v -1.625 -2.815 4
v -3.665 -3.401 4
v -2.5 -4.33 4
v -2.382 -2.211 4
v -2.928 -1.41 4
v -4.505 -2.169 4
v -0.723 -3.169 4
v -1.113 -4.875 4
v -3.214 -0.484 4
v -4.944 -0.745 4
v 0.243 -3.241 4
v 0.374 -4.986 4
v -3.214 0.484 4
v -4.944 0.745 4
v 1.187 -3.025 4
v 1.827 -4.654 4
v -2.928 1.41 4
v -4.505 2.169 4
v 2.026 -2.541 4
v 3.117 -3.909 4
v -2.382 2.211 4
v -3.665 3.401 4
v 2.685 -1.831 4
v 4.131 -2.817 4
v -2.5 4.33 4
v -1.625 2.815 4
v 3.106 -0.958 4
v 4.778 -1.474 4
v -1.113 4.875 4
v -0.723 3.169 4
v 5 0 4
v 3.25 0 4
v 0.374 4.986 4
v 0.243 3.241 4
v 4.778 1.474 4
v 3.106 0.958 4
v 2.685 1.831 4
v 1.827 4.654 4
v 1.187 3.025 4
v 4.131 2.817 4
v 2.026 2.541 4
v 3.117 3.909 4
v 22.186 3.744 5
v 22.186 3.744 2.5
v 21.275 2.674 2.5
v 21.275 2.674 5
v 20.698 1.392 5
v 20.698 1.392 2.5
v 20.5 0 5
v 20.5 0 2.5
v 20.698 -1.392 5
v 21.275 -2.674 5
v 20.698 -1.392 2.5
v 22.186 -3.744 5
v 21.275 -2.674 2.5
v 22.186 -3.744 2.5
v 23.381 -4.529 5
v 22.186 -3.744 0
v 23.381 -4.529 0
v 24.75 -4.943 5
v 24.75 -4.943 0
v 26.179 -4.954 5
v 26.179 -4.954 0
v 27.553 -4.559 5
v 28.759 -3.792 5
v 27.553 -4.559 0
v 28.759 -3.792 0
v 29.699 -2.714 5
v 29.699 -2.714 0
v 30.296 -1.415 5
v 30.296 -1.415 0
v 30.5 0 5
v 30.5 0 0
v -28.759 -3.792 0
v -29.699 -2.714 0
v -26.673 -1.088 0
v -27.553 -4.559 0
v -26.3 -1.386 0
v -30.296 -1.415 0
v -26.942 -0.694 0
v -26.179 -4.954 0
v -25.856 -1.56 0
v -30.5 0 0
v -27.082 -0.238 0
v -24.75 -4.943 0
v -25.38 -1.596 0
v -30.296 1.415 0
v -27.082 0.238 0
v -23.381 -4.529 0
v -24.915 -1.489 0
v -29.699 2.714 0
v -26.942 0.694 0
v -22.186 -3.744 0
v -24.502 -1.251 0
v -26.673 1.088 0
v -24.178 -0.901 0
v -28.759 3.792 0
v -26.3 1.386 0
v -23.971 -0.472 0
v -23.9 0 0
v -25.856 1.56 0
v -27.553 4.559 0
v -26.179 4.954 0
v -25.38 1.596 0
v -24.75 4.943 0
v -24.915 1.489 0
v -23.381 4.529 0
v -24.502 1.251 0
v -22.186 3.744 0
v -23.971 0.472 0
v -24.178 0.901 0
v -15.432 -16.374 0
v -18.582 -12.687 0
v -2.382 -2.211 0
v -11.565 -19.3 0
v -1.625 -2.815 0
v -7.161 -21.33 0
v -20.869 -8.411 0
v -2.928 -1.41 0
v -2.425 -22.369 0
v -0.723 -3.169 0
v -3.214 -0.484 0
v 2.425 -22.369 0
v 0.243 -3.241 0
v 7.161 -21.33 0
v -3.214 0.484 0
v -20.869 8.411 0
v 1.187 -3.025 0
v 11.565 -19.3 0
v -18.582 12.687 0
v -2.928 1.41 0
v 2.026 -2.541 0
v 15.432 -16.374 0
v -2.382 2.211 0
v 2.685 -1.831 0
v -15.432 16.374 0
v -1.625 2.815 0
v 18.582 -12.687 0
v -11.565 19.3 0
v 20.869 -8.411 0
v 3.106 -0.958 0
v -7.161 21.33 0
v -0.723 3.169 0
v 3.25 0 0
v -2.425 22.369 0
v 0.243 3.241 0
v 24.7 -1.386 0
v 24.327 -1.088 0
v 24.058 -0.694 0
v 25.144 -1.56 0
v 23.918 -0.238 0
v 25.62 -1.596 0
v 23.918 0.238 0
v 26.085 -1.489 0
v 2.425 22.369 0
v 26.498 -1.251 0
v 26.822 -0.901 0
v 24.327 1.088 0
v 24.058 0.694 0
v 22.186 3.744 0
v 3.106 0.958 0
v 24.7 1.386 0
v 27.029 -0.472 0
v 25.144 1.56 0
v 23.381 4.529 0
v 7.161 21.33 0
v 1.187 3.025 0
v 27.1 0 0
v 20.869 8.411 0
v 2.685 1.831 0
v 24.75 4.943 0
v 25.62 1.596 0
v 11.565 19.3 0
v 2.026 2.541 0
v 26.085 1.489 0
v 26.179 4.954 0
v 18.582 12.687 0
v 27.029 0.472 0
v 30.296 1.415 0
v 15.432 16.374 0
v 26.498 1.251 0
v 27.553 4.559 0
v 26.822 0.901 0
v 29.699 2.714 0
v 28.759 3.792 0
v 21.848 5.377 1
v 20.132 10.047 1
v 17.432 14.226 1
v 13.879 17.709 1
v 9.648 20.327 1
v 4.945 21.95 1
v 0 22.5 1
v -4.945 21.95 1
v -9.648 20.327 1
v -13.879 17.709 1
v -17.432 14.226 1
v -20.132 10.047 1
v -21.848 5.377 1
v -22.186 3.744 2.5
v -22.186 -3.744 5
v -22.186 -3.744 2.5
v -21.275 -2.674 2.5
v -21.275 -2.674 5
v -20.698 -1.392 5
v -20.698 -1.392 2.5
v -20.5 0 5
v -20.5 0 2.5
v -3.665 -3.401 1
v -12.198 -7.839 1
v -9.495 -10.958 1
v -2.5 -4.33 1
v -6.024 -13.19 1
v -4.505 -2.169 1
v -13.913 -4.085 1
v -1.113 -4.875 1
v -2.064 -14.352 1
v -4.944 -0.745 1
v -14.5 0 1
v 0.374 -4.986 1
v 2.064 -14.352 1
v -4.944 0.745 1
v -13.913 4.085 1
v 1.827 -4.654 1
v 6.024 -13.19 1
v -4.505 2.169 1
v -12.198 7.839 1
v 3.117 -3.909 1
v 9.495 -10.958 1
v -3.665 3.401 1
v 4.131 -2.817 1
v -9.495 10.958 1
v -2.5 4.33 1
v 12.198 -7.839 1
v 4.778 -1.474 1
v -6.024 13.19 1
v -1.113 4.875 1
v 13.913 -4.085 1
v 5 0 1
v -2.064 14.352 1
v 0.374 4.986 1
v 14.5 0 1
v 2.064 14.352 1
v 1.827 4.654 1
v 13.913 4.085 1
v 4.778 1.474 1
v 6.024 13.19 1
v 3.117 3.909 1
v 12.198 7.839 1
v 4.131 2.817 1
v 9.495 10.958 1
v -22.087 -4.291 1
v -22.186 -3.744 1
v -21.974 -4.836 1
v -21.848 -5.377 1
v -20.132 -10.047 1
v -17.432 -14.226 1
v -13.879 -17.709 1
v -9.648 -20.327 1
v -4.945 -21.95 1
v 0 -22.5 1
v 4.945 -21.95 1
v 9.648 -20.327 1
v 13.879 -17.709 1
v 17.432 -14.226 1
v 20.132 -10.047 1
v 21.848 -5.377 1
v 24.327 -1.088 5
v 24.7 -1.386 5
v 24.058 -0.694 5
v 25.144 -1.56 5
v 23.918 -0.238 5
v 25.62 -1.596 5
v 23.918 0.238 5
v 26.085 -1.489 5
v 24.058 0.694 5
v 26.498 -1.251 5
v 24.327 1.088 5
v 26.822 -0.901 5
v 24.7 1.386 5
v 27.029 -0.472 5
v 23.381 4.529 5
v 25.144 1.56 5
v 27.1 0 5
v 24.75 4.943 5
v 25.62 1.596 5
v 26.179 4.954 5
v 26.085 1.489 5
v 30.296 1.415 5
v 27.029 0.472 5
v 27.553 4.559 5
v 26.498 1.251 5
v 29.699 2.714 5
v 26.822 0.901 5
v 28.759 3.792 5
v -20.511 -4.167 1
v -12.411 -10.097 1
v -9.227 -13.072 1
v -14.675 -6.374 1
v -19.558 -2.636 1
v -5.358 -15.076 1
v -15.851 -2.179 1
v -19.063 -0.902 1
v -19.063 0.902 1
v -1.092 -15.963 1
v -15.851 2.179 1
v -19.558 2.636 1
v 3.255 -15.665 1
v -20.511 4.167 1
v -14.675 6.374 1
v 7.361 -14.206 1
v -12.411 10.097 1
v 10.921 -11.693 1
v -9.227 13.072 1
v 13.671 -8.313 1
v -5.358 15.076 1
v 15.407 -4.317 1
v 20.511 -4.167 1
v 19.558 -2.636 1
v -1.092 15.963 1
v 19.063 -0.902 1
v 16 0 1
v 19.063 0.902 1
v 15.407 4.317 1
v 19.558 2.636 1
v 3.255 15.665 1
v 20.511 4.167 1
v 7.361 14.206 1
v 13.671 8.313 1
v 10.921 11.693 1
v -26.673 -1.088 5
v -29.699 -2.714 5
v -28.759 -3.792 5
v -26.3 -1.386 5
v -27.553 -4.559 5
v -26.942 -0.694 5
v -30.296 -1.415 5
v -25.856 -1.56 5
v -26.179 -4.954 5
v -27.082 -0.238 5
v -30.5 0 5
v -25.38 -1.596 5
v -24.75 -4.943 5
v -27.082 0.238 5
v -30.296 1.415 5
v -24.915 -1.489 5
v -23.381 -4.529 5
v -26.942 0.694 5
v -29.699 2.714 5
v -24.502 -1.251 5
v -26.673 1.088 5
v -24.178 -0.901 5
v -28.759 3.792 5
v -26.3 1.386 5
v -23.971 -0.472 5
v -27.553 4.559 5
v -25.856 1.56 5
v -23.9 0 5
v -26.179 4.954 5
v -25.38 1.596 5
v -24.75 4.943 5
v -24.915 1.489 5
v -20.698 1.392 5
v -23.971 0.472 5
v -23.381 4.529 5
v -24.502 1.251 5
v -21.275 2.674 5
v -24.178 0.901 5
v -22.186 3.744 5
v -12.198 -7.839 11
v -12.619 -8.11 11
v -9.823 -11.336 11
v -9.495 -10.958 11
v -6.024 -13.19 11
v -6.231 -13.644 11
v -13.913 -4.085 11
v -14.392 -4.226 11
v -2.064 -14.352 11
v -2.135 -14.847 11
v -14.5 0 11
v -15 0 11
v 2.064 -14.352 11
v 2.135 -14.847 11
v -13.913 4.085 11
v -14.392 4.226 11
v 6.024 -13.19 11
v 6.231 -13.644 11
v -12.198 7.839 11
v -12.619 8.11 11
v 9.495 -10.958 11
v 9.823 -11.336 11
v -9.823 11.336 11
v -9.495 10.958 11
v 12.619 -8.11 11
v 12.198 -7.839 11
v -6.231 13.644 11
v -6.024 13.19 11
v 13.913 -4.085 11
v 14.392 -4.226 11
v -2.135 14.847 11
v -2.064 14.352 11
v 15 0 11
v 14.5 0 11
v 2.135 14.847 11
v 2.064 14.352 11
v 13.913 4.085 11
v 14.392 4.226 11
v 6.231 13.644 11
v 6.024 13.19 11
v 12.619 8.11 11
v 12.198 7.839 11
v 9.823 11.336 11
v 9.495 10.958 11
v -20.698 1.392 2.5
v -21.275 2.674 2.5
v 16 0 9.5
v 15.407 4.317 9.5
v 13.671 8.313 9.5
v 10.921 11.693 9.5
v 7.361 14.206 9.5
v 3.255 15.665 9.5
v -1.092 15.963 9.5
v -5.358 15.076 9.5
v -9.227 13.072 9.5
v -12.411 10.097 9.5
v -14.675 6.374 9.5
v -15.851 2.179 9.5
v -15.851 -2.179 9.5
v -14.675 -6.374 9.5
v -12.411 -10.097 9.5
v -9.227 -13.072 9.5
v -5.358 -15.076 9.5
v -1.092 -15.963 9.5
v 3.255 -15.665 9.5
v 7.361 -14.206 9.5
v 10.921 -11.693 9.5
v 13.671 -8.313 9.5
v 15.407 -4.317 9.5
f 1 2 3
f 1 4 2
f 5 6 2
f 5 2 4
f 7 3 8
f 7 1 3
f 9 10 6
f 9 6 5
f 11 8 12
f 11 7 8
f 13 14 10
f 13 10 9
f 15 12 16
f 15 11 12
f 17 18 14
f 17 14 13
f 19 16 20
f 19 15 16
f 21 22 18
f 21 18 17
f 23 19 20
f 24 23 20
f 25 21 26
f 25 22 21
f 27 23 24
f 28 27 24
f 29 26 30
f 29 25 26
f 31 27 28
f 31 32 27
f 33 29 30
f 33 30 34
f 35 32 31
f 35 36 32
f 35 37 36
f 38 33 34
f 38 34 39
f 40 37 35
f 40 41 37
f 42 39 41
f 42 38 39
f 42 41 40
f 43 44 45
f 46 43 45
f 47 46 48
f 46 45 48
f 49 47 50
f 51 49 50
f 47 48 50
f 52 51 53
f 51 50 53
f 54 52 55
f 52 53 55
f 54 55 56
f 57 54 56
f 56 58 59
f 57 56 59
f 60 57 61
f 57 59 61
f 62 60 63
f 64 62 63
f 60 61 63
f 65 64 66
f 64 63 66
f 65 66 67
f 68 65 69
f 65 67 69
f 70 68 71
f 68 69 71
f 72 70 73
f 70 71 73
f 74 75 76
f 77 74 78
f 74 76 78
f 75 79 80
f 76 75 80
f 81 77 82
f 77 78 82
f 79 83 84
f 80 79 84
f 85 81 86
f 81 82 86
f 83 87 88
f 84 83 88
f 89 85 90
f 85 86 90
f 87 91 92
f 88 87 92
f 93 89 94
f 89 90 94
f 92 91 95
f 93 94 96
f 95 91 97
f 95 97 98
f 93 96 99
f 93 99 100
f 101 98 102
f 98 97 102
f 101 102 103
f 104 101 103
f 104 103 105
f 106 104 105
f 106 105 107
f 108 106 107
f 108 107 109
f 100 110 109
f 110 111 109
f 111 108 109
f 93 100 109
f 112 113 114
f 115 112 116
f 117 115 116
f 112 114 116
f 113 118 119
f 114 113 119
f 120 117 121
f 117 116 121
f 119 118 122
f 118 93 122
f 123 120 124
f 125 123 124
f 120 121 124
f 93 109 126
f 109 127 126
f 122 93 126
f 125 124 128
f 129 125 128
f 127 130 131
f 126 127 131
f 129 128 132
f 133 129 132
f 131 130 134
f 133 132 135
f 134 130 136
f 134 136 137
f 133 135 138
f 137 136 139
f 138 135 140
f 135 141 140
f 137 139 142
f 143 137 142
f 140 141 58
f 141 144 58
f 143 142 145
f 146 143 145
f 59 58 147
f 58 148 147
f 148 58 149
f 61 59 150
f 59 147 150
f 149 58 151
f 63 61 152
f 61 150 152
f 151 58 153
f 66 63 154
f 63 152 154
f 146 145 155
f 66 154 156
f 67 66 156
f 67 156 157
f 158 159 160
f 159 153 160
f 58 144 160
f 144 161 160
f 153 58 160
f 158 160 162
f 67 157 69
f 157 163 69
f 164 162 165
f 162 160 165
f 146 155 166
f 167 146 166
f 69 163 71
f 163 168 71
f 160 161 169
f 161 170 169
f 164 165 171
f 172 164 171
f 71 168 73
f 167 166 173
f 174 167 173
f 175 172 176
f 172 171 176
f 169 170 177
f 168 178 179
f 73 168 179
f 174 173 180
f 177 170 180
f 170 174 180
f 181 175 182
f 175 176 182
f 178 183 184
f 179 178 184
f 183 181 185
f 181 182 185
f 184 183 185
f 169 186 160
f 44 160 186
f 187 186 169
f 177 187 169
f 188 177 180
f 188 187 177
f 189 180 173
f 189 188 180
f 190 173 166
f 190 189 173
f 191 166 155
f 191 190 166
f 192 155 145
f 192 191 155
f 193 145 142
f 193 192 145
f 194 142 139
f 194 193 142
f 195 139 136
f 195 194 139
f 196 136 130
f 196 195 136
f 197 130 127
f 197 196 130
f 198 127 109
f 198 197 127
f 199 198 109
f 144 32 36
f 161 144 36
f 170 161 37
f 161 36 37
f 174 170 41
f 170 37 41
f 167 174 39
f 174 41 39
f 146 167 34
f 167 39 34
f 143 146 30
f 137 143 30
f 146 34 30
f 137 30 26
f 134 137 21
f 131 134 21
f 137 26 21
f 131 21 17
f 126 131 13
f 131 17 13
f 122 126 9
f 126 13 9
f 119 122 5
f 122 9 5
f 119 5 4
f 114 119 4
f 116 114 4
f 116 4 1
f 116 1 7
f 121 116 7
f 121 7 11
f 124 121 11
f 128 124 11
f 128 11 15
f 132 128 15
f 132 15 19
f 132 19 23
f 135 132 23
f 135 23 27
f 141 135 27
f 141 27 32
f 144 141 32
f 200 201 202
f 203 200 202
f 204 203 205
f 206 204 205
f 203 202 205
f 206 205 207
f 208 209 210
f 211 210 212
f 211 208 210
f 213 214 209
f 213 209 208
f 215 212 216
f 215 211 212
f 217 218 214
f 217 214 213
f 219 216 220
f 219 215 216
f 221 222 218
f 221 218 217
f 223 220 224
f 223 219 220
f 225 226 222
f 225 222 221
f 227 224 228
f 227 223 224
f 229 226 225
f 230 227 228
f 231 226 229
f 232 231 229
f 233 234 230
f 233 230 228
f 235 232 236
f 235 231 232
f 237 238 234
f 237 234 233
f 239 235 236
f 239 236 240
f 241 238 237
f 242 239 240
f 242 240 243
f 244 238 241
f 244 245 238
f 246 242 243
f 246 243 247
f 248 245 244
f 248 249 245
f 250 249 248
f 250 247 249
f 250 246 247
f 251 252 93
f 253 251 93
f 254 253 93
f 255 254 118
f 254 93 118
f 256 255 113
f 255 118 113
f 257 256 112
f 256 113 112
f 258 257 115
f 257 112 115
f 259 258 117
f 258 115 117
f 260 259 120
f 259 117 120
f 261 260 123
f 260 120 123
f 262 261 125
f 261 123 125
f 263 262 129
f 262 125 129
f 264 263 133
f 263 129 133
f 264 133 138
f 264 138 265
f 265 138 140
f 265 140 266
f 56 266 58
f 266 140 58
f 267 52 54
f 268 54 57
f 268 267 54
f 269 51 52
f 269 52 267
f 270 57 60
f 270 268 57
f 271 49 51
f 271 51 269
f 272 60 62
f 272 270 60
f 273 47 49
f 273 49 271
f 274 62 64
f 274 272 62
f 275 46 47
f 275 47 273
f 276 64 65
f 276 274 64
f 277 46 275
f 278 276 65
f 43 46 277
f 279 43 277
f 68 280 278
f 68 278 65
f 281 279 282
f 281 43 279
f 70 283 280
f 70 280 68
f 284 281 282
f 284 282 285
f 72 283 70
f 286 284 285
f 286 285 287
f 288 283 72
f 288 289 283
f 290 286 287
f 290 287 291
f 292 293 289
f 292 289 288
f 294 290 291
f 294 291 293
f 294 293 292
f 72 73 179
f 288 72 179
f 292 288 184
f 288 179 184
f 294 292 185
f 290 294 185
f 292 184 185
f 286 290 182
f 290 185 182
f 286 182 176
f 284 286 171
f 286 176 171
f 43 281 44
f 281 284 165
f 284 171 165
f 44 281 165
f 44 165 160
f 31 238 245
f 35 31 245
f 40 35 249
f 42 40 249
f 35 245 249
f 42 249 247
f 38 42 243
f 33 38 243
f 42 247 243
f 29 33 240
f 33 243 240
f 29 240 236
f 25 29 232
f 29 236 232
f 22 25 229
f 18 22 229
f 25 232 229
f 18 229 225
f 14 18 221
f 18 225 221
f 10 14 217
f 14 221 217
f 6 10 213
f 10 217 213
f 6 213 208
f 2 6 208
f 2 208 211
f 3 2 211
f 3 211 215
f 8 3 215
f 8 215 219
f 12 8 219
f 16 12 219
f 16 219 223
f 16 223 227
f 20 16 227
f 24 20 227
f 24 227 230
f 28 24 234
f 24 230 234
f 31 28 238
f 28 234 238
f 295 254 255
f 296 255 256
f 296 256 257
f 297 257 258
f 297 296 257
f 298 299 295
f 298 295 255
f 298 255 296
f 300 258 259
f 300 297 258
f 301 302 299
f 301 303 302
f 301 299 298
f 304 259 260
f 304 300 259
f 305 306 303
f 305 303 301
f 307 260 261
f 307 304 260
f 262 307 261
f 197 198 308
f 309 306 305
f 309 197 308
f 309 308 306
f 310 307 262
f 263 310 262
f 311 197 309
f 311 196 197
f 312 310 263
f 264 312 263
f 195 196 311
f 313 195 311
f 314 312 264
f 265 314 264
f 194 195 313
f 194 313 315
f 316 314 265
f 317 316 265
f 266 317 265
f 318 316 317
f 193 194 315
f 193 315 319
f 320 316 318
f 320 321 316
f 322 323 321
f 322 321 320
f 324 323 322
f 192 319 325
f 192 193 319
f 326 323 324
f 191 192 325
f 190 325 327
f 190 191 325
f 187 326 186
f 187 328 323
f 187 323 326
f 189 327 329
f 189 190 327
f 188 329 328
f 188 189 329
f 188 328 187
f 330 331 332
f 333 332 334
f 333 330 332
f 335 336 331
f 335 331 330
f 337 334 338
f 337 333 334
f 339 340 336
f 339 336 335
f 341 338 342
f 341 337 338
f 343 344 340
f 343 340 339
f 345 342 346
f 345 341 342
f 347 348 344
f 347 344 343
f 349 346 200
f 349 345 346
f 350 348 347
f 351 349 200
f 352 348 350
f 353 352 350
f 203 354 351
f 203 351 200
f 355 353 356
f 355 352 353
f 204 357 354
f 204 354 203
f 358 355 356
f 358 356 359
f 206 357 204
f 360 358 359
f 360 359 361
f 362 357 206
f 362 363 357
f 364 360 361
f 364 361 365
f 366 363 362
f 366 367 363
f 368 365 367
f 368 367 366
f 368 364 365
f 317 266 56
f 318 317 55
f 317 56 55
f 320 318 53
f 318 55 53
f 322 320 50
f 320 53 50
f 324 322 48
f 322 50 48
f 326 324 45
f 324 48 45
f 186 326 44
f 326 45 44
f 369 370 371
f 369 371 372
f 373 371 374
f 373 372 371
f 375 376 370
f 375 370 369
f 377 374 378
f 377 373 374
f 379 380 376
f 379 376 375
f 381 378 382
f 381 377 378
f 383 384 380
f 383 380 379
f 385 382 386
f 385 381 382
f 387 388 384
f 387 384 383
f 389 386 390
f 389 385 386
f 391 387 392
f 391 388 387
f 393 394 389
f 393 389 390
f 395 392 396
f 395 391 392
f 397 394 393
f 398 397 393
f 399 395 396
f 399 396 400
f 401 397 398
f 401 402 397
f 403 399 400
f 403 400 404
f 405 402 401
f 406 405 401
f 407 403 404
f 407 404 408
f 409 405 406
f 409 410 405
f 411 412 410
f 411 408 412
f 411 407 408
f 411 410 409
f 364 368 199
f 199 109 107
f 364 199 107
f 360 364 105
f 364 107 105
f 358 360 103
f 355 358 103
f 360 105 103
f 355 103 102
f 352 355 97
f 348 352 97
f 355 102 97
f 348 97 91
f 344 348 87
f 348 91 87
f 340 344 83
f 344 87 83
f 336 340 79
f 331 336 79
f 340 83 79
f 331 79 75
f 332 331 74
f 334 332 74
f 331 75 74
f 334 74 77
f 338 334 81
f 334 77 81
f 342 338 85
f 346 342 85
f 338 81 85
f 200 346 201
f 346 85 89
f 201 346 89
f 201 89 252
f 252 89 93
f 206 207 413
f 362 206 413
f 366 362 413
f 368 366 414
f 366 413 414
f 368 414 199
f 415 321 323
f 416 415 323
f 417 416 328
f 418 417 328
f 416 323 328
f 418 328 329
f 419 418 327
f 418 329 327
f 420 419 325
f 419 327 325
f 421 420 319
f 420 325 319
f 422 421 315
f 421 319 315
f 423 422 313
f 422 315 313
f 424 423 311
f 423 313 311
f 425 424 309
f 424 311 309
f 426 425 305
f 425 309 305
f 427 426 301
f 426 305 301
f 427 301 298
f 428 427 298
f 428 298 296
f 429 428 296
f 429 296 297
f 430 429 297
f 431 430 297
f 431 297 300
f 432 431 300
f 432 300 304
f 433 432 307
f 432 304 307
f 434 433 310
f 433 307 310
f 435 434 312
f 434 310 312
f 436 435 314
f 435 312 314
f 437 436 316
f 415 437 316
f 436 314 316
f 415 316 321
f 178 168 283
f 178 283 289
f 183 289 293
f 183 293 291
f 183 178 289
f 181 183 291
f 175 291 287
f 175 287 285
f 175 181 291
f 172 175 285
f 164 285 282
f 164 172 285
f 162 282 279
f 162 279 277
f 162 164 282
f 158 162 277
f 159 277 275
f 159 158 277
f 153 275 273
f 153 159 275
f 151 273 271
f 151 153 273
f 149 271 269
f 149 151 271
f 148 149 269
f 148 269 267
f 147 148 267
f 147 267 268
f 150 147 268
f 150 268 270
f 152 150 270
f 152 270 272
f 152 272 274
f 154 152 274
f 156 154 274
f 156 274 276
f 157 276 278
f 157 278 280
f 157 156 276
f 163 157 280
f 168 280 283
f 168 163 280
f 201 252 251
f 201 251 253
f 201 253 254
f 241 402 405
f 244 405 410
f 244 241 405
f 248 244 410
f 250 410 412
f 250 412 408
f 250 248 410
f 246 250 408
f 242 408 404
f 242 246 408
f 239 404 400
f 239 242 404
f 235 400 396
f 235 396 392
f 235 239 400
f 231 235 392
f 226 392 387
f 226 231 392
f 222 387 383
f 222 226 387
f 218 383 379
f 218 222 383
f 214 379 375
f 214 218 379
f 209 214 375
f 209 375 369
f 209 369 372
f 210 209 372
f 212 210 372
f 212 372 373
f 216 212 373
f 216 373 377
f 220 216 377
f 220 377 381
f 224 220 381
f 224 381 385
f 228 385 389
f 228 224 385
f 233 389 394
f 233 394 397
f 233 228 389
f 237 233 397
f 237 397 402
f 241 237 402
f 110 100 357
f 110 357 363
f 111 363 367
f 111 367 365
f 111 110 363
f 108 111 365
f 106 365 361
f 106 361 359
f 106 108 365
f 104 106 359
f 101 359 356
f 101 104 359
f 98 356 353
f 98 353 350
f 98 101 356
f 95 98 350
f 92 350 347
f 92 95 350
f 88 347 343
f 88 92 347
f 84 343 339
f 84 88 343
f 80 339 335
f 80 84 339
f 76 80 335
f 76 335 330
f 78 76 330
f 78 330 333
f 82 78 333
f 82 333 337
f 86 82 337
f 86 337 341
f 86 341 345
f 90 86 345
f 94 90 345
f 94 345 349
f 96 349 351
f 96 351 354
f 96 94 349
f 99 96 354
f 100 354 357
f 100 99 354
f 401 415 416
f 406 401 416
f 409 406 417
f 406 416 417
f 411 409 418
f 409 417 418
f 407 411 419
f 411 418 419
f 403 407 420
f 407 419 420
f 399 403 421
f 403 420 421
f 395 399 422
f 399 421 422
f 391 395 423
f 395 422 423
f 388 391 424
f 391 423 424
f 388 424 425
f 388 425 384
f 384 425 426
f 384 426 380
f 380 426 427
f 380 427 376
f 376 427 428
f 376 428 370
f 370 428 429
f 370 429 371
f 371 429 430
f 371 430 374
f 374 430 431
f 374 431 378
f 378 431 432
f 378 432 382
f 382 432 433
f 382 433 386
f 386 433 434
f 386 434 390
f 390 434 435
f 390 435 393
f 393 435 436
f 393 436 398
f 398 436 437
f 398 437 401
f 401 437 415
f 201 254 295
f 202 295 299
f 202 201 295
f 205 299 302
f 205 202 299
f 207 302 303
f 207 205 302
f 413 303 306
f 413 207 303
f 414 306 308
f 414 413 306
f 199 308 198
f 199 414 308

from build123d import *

# Parameters (mm, degrees)
F0_R         = 1.6
F1_DEPTH     = 5
F2_DEPTH     = 1
F3_R         = 16
F3_R_2       = 14.5
F4_DEPTH     = 10
F5_SIZE2     = 1.5
F5_SIZE      = 1
F8_T4_ANGLE  = 185.4300536725
F8_S5_R      = 22.5
F8_T6_DEPTH  = 9
F8_T10_ANGLE = 185.4300536725
F8_S11_R     = 22.5
F8_T12_DEPTH = 9
F9_R         = 5
F10_DEPTH    = 3
F11_R        = 3.25
F12_DEPTH    = 5


# Not quite as in the source:
# - a fillet or chamfer that OpenCascade refuses, or shapes differently, is made with other operations: its cross-section is extruded or revolved along the edge and cut away or added
# - a feature of the source that left no trace in its solid (it failed there, or was rolled back) is left out


with BuildPart() as f1:
    # F0 (on Top) → F1 (new body)
    with BuildSketch(Plane.XY):
        with BuildLine():
            ThreePointArc((-22.1862745098, -3.7442253372), (-22.5, 0), (-22.1862745098, 3.7442253372))
            ThreePointArc((-22.1862745098, 3.7442253372), (-30.5, 0), (-22.1862745098, -3.7442253372))
        make_face()
        with Locations((-25.5, 0)):
            Circle(F0_R, mode=Mode.SUBTRACT)
        with BuildLine():
            ThreePointArc((-20.5, 0), (-20.9410183456, 2.0532136456), (-22.1862745098, 3.7442253372))
            ThreePointArc((-22.1862745098, 3.7442253372), (-22.5, 0), (-22.1862745098, -3.7442253372))
            ThreePointArc((-22.1862745098, -3.7442253372), (-20.9410183456, -2.0532136456), (-20.5, 0))
        make_face()
    extrude(amount=F1_DEPTH)



with BuildPart() as f1b:
    # F0 (on Top) → F1, piece 2 (new body)
    with BuildSketch(Plane.XY):
        with BuildLine():
            ThreePointArc((22.1862745098, 3.7442253372), (22.4214314493, 1.8786728733), (22.5, 0))
            ThreePointArc((22.5, 0), (22.4214314493, -1.8786728733), (22.1862745098, -3.7442253372))
            ThreePointArc((22.1862745098, -3.7442253372), (27.5532136456, -4.5589816544), (30.5, 0))
            ThreePointArc((30.5, 0), (27.5532136456, 4.5589816544), (22.1862745098, 3.7442253372))
        make_face()
        with Locations((25.5, 0)):
            Circle(F0_R, mode=Mode.SUBTRACT)
        with BuildLine():
            ThreePointArc((22.1862745098, -3.7442253372), (22.4214314493, -1.8786728733), (22.5, 0))
            ThreePointArc((22.5, 0), (22.4214314493, 1.8786728733), (22.1862745098, 3.7442253372))
            ThreePointArc((22.1862745098, 3.7442253372), (20.5, 0), (22.1862745098, -3.7442253372))
        make_face()
    extrude(amount=F1_DEPTH)


with BuildPart() as f1_1:
    add(f1.part)

    add(f1b.part)  # F2 merges F1b
    # F0 (on Top) → F2 (join)
    with BuildSketch(Plane.XY):
        with BuildLine():
            ThreePointArc((22.1862745098, -3.7442253372), (20.5, 0), (22.1862745098, 3.7442253372))
            ThreePointArc((22.1862745098, 3.7442253372), (0, 22.5), (-22.1862745098, 3.7442253372))
            ThreePointArc((-22.1862745098, 3.7442253372), (-20.9410183456, 2.0532136456), (-20.5, 0))
            ThreePointArc((-20.5, 0), (-20.9410183456, -2.0532136456), (-22.1862745098, -3.7442253372))
            ThreePointArc((-22.1862745098, -3.7442253372), (0, -22.5), (22.1862745098, -3.7442253372))
        make_face()
    extrude(amount=F2_DEPTH)

    # F3 (on face) → F4 (join)
    with BuildSketch(Plane.XY.offset(1)):
        Circle(F3_R)
        Circle(F3_R_2, mode=Mode.SUBTRACT)
    extrude(amount=F4_DEPTH)

    # F5
    f5_edges = [f1_1.edges().sort_by_distance(p)[0] for p in [
        (-16, 0, 11),
    ]]
    f5_side = f1_1.faces().sort_by_distance((-15.547452, 0, 11))[0]
    chamfer(f5_edges, length=F5_SIZE, length2=F5_SIZE2, reference=f5_side)

    # F8: chamfer of 1.5 on 2 edges, made by hand


with BuildPart() as f8_tool2:
    # F8_s3 → F8_t4 (revolve)
    with BuildSketch(Plane(origin=(25.4427839223, 1.2065389767, 0), x_dir=(0, 0, 1), z_dir=(0.9988774861, 0.0473684257, 0))):
        Polygon((1, 7.7078948555), (2.5, 6.2078948555), (1, 6.2078948555), align=None)
    revolve(axis=Axis((25.5, 0, 1), (0, 0, -1)), revolution_arc=F8_T4_ANGLE)

    # F8_s5 → F8_t6 (intersect, symmetric)
    with BuildSketch(Plane.XY.offset(1.8)):
        Circle(F8_S5_R)
    extrude(amount=F8_T6_DEPTH, both=True, mode=Mode.INTERSECT)


with BuildPart() as f1_2:
    add(f1_1.part)

    # F8_t1: union F8_tool2
    add(f8_tool2.part)


with BuildPart() as f8_tool8:
    # F8_s9 → F8_t10 (revolve)
    with BuildSketch(Plane(origin=(-25.4427839223, 1.2065389767, 0), x_dir=(0, 0, 1), z_dir=(-0.9988774861, 0.0473684257, 0))):
        Polygon((1, -7.7078948555), (2.5, -6.2078948555), (1, -6.2078948555), align=None)
    revolve(axis=Axis((-25.5, 0, 1), (0, 0, 1)), revolution_arc=F8_T10_ANGLE)

    # F8_s11 → F8_t12 (intersect, symmetric)
    with BuildSketch(Plane.XY.offset(1.7)):
        Circle(F8_S11_R)
    extrude(amount=F8_T12_DEPTH, both=True, mode=Mode.INTERSECT)


with BuildPart() as f1_3:
    add(f1_2.part)

    # F8_t7: union F8_tool8
    add(f8_tool8.part)

    # F9 (on face) → F10 (join)
    with BuildSketch(Plane.XY.offset(1)):
        Circle(F9_R)
    extrude(amount=F10_DEPTH)

    # F11 (on face) → F12 (cut)
    with BuildSketch(Plane.XY.offset(4)):
        Circle(F11_R)
    extrude(amount=-F12_DEPTH, mode=Mode.SUBTRACT)


solid = f1_3.part
